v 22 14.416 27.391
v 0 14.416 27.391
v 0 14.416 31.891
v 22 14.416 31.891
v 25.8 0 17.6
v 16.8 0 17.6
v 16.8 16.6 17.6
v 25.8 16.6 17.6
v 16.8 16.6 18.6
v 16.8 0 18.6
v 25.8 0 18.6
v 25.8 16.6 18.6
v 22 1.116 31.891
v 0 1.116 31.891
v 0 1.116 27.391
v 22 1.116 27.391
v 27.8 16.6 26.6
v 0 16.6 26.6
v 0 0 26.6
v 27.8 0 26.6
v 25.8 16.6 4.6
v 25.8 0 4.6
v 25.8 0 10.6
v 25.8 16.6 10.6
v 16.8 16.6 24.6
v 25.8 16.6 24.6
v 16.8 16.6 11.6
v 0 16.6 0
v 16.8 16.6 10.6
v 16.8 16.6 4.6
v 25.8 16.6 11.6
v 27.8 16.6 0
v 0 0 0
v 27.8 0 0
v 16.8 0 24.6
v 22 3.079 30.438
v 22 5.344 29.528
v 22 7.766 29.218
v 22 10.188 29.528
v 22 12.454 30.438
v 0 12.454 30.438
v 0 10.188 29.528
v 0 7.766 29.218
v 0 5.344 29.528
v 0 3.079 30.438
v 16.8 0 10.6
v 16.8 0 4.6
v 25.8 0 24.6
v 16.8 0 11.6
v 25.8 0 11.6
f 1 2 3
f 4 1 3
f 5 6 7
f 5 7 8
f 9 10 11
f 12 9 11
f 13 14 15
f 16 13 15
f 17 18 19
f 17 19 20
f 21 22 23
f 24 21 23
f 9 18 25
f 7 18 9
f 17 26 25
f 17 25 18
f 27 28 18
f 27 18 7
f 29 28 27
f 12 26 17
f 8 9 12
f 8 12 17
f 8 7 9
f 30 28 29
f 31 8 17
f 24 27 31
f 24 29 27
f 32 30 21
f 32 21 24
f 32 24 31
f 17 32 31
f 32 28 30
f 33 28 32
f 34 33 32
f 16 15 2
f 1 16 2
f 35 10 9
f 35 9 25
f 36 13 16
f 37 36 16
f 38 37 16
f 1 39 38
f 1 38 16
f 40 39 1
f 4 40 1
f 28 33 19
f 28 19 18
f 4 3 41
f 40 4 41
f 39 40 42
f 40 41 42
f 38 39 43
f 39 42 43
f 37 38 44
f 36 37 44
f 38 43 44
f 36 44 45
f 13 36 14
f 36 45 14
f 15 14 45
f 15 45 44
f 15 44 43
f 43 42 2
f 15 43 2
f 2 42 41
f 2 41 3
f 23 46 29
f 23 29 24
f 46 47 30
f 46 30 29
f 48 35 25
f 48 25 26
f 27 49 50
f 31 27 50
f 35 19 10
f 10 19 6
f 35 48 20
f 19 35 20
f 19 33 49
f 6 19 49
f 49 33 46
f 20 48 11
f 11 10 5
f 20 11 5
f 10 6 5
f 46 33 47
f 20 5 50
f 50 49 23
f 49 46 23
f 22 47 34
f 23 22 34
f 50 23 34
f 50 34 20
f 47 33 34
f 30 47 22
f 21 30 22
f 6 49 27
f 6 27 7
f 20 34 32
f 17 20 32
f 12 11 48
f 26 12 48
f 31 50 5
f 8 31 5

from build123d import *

# Parameters (mm, degrees)
F0_W     = 27.8
F0_H     = 16.6
F1_DEPTH = 26.6
F2_W     = 9
F2_H     = 6
F3_DEPTH = 16.6
F5_DEPTH = 22


with BuildPart() as f1:
    # F0 (on Top) → F1 (new body)
    with BuildSketch(Plane.XY):
        with Locations((13.9, 8.3)):
            Rectangle(F0_W, F0_H)
    extrude(amount=F1_DEPTH)

    # F2 (on face) → F3 (cut)
    with BuildSketch(Plane.XZ):
        with Locations((21.3, 21.6)):
            Rectangle(F2_W, F2_H)
        with Locations((21.3, 14.6)):
            Rectangle(F2_W, F2_H)
        with Locations((21.3, 7.6)):
            Rectangle(F2_W, F2_H)
    extrude(amount=-F3_DEPTH, mode=Mode.SUBTRACT)


with BuildPart() as f5:
    # F4 (on Right) → F5 (new body)
    with BuildSketch(Plane.YZ):
        with BuildLine():
            Line((1.116303, 27.39075), (14.416303, 27.39075))
            Line((14.416303, 27.39075), (14.416303, 31.89075))
            ThreePointArc((14.416303, 31.89075), (7.766303, 29.217626), (1.116303, 31.89075))
            Line((1.116303, 31.89075), (1.116303, 27.39075))
        make_face()
    extrude(amount=F5_DEPTH)


solid = Compound([f1.part, f5.part])
